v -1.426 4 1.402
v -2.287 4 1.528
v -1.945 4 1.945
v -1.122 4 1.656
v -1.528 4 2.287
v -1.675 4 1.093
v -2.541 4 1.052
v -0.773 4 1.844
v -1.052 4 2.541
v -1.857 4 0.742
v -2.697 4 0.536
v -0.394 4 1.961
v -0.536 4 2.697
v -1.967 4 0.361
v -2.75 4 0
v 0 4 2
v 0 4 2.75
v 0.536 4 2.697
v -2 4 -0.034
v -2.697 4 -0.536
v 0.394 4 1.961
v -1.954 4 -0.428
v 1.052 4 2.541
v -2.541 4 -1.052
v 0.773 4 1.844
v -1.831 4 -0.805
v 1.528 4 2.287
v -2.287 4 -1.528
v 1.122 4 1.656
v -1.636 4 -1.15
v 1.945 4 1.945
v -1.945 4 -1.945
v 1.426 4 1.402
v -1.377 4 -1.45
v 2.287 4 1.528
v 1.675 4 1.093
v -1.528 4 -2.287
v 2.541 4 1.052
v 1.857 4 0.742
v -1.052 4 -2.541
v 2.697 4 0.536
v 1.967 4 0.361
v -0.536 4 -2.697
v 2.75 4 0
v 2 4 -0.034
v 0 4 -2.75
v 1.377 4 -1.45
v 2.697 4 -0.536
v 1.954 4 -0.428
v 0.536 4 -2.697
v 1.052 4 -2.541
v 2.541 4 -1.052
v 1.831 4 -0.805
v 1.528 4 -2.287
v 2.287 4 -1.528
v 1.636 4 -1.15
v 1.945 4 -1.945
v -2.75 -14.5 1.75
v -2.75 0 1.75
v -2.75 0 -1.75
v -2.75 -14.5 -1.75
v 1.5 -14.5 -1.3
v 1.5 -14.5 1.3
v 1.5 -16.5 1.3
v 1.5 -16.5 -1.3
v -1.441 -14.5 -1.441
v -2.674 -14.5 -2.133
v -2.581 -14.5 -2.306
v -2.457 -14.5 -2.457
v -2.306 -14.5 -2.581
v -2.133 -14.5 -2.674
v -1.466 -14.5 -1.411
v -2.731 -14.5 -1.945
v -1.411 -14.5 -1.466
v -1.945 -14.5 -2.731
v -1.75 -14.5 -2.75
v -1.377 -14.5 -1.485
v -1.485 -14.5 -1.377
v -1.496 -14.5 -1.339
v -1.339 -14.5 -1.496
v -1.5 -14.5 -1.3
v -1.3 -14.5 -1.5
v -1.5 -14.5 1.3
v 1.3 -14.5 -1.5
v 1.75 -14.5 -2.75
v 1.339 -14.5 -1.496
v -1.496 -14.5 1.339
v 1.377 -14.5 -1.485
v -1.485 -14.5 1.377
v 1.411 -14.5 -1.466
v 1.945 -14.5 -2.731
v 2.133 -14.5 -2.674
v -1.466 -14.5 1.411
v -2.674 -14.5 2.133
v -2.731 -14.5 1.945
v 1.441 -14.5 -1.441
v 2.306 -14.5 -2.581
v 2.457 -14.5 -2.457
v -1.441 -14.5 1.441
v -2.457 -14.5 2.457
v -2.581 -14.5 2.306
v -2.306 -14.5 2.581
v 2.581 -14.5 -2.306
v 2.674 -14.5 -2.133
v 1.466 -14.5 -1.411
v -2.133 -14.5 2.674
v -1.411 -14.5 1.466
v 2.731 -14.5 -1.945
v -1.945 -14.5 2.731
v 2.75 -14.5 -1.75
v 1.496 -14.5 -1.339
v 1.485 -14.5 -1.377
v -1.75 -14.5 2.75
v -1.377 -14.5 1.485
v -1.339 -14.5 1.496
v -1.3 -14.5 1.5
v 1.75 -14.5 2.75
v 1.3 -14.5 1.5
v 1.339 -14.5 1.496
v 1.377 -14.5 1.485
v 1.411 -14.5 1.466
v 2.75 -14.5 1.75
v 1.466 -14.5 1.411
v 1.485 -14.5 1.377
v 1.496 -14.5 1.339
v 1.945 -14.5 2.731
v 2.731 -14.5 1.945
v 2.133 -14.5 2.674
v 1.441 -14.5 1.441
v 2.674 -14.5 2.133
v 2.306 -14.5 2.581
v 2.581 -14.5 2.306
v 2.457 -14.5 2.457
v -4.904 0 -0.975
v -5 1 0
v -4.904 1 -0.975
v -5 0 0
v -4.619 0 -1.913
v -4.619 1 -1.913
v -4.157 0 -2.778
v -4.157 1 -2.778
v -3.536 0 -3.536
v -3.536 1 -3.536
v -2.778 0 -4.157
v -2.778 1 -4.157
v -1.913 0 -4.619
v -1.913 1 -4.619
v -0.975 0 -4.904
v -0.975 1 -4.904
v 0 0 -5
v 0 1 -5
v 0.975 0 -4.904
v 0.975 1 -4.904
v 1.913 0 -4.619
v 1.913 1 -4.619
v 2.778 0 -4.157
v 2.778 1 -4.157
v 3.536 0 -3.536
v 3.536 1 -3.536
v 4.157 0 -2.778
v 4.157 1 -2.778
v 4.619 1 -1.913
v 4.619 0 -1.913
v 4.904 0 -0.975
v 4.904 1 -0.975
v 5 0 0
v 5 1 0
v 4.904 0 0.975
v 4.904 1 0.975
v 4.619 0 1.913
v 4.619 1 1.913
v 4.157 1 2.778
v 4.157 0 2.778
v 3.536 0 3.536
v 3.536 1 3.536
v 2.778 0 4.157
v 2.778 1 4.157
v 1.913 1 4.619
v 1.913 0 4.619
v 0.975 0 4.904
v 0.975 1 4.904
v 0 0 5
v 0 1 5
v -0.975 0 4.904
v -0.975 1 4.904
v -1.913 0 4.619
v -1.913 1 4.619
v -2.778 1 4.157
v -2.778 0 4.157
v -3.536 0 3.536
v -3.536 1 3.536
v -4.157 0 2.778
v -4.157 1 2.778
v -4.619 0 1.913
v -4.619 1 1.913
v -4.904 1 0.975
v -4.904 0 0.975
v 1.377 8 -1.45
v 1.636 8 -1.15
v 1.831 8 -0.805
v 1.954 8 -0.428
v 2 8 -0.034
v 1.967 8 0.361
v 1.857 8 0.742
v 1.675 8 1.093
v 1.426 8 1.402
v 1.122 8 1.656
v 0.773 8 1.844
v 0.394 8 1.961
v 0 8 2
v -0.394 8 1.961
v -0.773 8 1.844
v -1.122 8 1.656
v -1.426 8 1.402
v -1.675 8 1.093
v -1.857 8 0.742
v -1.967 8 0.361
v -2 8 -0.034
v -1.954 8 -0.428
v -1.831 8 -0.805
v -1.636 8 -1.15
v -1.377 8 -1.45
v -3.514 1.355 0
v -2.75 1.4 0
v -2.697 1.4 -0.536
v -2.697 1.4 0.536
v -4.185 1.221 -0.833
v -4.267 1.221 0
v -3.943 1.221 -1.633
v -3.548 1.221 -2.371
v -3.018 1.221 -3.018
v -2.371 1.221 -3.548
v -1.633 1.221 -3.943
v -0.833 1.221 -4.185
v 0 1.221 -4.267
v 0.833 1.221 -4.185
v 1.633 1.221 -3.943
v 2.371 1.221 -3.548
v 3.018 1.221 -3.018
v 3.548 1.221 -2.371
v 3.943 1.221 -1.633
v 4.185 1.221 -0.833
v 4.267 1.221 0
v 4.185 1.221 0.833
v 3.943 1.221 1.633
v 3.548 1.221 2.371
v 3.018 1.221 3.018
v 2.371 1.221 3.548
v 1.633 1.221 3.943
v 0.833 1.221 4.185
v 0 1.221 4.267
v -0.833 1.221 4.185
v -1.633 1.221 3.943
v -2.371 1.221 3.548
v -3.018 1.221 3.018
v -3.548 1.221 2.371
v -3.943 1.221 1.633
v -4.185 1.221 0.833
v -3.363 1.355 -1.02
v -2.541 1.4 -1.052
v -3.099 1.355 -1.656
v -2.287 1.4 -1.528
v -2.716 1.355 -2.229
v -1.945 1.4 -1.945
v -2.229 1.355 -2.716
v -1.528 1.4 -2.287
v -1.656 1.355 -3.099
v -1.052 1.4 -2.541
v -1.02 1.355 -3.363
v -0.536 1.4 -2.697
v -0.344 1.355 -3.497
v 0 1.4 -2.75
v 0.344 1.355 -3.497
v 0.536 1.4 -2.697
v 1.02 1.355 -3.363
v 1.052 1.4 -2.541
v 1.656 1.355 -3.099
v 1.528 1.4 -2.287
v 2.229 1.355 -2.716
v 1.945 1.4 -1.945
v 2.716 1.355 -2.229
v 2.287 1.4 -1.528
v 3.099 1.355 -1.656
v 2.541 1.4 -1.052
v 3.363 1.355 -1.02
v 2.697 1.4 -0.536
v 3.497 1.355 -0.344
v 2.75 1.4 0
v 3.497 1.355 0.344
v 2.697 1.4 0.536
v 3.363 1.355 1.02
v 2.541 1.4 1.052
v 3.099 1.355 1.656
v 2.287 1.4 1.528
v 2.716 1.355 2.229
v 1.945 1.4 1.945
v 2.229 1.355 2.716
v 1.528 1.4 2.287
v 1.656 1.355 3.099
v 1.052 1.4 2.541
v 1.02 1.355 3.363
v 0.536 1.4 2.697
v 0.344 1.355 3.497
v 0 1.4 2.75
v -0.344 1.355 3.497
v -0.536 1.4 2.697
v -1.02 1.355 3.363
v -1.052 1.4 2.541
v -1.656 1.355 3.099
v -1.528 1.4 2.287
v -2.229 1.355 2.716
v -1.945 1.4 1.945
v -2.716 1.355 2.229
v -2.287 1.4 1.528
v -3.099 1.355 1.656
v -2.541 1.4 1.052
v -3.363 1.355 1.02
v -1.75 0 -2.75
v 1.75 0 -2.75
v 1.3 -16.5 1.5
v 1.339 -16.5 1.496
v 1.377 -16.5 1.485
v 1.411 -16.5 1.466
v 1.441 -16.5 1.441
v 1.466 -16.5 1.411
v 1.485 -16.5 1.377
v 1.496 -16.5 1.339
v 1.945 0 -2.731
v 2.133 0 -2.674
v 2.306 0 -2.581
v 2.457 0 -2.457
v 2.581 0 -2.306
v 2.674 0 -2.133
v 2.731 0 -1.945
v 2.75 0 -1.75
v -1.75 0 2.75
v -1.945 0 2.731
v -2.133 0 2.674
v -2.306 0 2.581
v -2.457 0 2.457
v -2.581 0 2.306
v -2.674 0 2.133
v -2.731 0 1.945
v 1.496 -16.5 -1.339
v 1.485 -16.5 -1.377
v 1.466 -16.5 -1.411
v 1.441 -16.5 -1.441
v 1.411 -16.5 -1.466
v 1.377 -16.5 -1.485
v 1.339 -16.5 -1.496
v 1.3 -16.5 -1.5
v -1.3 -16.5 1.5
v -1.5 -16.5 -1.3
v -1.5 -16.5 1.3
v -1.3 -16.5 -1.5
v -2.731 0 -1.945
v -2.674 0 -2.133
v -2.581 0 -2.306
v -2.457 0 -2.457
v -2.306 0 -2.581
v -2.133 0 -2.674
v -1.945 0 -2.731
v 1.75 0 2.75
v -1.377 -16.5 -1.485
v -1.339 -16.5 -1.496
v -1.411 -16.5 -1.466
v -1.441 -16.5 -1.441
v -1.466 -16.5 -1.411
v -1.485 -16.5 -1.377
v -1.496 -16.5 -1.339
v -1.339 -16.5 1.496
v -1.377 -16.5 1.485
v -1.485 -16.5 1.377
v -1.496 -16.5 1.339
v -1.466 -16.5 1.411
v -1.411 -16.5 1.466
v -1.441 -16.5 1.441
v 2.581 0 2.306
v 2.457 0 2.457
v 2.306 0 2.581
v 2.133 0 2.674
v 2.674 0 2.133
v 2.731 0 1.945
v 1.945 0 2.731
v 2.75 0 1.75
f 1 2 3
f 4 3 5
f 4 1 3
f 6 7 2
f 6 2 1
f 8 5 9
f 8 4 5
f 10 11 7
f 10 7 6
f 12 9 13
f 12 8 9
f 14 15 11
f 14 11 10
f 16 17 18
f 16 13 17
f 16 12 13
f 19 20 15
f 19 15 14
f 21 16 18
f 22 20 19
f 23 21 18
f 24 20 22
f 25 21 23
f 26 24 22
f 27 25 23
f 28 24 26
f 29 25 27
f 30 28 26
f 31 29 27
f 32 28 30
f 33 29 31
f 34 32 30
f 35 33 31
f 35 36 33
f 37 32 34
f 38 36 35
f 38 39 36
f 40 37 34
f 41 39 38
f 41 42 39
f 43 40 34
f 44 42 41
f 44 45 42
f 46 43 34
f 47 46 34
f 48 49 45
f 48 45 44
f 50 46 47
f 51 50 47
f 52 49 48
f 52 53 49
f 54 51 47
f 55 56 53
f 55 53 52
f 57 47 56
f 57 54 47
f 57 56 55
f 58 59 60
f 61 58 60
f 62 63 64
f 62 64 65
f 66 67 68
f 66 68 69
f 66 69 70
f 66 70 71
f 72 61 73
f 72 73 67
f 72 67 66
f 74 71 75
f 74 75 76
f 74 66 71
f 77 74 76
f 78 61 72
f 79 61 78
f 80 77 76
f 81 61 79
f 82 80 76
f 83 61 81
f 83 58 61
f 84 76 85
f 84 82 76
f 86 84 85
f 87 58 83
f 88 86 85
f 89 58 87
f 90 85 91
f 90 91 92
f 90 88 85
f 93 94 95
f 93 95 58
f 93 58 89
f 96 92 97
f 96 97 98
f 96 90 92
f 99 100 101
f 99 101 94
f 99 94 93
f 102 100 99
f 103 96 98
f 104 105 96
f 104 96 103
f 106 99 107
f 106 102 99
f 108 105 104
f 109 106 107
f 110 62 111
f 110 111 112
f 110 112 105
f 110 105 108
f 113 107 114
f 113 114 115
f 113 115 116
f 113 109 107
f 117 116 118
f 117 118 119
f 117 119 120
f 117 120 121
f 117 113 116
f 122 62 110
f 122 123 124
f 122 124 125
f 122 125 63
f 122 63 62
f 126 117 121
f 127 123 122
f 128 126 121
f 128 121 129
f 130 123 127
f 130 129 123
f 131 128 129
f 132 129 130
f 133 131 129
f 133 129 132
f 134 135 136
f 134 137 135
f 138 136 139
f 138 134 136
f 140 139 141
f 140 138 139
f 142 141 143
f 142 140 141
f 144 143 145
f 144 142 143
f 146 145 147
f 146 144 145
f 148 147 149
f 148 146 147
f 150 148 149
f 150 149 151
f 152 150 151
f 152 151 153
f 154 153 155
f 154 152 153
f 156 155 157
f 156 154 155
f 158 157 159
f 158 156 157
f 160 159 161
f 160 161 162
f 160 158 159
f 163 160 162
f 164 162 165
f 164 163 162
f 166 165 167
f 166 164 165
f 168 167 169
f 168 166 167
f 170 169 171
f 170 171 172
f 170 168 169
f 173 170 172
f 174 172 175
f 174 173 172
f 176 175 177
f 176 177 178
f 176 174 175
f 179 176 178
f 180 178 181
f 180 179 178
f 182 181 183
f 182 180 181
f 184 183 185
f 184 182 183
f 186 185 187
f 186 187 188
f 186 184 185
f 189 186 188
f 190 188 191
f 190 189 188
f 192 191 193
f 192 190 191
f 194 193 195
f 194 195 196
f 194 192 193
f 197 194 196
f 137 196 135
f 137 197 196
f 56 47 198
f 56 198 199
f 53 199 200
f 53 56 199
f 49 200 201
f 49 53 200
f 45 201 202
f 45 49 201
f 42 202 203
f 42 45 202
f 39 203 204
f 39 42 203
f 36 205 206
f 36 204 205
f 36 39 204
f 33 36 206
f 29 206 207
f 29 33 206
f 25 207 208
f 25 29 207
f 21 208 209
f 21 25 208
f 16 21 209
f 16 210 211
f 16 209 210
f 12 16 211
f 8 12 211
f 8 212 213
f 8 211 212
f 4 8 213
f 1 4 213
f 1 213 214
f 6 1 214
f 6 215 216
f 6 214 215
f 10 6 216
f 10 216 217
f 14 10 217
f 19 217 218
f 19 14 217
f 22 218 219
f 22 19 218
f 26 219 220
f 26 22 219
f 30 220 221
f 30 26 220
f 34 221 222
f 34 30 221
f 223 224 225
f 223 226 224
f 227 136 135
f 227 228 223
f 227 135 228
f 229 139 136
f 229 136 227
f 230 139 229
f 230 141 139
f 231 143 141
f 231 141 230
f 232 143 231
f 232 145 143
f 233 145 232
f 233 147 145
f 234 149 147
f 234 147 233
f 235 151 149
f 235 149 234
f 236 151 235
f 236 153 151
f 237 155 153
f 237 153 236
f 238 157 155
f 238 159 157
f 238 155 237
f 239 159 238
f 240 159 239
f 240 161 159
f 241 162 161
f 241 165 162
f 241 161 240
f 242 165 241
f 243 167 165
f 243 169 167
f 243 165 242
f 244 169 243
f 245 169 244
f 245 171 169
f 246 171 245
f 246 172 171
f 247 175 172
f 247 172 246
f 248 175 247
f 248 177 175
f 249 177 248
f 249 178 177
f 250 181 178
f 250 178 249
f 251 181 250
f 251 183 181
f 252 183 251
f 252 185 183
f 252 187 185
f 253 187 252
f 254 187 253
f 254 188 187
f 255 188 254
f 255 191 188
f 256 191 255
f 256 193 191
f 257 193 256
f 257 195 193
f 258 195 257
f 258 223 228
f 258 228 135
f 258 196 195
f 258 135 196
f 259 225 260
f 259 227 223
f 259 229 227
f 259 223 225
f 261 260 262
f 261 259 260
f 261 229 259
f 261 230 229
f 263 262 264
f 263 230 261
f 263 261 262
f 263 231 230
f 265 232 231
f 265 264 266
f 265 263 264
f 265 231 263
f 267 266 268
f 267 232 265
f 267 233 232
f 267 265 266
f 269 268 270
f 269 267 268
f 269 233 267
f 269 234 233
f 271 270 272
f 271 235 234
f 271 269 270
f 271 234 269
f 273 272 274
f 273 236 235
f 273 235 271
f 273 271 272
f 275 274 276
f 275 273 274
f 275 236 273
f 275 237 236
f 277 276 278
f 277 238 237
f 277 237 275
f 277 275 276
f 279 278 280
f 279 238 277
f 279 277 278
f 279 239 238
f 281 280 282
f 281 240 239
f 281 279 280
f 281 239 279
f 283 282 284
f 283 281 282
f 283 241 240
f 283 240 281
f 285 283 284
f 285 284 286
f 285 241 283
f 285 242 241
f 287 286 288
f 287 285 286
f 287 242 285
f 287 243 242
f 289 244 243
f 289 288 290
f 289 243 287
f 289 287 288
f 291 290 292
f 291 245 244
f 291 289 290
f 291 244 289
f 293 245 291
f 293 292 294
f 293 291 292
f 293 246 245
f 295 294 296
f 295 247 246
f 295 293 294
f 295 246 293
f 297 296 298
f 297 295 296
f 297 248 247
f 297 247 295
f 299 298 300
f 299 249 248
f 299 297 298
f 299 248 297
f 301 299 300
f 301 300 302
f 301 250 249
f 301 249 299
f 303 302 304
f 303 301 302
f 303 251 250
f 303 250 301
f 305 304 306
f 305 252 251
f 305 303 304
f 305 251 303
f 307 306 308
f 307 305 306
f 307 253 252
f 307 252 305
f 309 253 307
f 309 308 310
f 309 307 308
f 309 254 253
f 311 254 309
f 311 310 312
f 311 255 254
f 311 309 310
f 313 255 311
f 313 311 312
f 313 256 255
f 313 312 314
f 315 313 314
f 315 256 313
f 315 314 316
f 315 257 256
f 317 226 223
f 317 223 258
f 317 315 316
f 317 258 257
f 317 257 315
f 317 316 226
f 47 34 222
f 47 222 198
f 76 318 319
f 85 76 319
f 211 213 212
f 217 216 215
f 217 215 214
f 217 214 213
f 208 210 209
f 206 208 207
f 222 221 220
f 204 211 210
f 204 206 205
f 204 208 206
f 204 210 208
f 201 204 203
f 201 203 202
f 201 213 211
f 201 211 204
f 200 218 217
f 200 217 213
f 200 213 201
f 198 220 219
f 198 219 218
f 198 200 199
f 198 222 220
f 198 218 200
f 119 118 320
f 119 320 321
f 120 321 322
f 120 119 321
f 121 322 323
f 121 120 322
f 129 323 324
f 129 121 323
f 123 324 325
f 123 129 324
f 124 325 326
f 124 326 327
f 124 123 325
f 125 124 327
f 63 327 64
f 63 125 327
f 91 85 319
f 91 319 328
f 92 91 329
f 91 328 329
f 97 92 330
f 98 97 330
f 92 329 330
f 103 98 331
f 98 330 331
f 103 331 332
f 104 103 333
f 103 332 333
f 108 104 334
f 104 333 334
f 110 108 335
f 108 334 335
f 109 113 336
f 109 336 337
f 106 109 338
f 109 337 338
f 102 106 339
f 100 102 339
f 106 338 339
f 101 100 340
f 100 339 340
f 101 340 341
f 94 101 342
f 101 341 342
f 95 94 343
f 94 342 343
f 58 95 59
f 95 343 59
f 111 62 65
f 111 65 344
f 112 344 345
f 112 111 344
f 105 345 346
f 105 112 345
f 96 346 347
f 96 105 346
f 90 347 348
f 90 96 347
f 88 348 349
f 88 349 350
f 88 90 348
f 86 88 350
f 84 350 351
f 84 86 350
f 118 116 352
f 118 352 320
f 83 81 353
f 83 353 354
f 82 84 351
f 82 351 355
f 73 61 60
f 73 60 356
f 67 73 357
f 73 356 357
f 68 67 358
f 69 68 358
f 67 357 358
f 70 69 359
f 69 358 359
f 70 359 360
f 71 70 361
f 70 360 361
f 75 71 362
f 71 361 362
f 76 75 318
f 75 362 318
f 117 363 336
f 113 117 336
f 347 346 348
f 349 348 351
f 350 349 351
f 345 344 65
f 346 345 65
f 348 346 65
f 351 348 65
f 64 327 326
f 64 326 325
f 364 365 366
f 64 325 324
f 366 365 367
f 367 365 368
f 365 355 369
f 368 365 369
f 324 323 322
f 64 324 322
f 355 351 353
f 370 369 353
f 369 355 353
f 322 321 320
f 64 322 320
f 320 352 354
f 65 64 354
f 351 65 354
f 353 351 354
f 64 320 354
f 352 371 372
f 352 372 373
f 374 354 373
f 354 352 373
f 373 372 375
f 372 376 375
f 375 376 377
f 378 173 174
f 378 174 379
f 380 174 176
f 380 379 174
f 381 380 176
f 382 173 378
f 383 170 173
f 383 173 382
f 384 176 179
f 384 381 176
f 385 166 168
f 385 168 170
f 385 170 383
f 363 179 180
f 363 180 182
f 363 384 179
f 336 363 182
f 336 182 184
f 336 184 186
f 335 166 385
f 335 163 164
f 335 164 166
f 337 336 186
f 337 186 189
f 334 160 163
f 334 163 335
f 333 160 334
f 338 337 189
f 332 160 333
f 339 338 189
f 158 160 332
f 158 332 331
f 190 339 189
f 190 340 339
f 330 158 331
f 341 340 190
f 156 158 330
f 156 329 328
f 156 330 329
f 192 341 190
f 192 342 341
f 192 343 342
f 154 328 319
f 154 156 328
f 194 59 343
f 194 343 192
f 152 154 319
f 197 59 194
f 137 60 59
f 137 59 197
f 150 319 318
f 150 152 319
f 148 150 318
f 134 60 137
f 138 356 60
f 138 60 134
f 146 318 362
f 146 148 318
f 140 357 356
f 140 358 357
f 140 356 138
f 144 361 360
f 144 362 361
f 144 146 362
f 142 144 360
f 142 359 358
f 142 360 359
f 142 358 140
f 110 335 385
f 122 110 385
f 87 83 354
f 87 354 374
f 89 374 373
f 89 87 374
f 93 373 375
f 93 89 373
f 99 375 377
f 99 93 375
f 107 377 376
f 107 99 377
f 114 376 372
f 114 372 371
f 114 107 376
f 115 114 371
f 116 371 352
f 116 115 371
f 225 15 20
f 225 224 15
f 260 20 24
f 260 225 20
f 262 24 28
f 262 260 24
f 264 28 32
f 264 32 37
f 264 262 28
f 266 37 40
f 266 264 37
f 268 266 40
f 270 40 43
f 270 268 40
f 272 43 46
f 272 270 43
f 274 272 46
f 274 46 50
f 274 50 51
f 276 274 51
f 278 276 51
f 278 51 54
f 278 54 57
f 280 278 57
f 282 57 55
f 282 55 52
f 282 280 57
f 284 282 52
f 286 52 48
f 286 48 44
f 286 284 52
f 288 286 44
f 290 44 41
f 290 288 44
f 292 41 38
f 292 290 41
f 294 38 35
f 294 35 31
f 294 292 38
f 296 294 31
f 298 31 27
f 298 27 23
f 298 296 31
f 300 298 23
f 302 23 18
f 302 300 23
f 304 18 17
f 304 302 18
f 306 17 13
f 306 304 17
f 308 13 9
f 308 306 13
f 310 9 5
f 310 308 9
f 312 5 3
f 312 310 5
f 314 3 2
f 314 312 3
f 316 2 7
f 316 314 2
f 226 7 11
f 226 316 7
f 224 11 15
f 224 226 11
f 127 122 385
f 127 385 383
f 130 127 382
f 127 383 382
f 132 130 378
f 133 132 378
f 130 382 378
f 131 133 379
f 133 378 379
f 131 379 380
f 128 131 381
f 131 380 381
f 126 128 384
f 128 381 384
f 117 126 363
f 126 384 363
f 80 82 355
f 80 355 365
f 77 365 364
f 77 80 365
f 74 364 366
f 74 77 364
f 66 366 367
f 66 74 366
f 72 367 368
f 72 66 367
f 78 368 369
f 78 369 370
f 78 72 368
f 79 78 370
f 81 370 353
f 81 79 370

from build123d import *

# Parameters (mm, degrees)
CUT_EXTRUDE1_START  = -4
CUT_EXTRUDE1_DEPTH  = 4
BOSS_EXTRUDE1_DEPTH = 14.5
BOSS_EXTRUDE2_DEPTH = 2


with BuildPart() as part:
    # Sketch1 → Revolve1 (revolve)
    with BuildSketch(Plane.XY, mode=Mode.PRIVATE) as revolve1_sk:
        with BuildLine():
            Line((0, 8), (2, 8))
            Line((2, 8), (2, 4))
            Line((2, 4), (2.75, 4))
            Line((2.75, 4), (2.75, 1.4))
            ThreePointArc((2.75, 1.4), (3.892639488, 1.299222121), (5, 1))
            Line((5, 1), (5, 0))
            Line((5, 0), (0, 0))
            Line((0, 0), (0, 8))
        make_face()
    revolve(revolve1_sk.sketch.rotate(Axis((0, 8, 0), (0, -1, 0)), 180), axis=Axis((0, 8, 0), (0, -1, 0)))

    # Sketch2 → Cut-Extrude1 (cut)
    with BuildSketch(Plane(origin=(0, 8, 0), x_dir=(1, 0, 0), z_dir=(0, 1, 0)).offset(CUT_EXTRUDE1_START)):
        with BuildLine():
            Line((-1.377497731, 1.45), (1.377497731, 1.45))
            ThreePointArc((1.377497731, 1.45), (0, 2), (-1.377497731, 1.45))
        make_face()
    extrude(amount=CUT_EXTRUDE1_DEPTH, mode=Mode.SUBTRACT)

    # Sketch3 → Boss-Extrude1 (add)
    with BuildSketch(Plane.XZ):
        with BuildLine():
            Line((-1.75, -2.75), (1.75, -2.75))
            ThreePointArc((1.75, -2.75), (2.457106781, -2.457106781), (2.75, -1.75))
            Line((2.75, -1.75), (2.75, 1.75))
            ThreePointArc((2.75, 1.75), (2.457106781, 2.457106781), (1.75, 2.75))
            Line((1.75, 2.75), (-1.75, 2.75))
            ThreePointArc((-1.75, 2.75), (-2.457106781, 2.457106781), (-2.75, 1.75))
            Line((-2.75, 1.75), (-2.75, -1.75))
            ThreePointArc((-2.75, -1.75), (-2.457106781, -2.457106781), (-1.75, -2.75))
        make_face()
    extrude(amount=BOSS_EXTRUDE1_DEPTH)

    # Sketch5 → Boss-Extrude2 (add)
    with BuildSketch(Plane.XZ.offset(14.5)):
        with BuildLine():
            Line((1.3, -1.5), (-1.3, -1.5))
            ThreePointArc((-1.3, -1.5), (-1.441421356, -1.441421356), (-1.5, -1.3))
            Line((-1.5, -1.3), (-1.5, 1.3))
            ThreePointArc((-1.5, 1.3), (-1.441421356, 1.441421356), (-1.3, 1.5))
            Line((-1.3, 1.5), (1.3, 1.5))
            ThreePointArc((1.3, 1.5), (1.441421356, 1.441421356), (1.5, 1.3))
            Line((1.5, 1.3), (1.5, -1.3))
            ThreePointArc((1.5, -1.3), (1.441421356, -1.441421356), (1.3, -1.5))
        make_face()
    extrude(amount=BOSS_EXTRUDE2_DEPTH)


solid = part.part
